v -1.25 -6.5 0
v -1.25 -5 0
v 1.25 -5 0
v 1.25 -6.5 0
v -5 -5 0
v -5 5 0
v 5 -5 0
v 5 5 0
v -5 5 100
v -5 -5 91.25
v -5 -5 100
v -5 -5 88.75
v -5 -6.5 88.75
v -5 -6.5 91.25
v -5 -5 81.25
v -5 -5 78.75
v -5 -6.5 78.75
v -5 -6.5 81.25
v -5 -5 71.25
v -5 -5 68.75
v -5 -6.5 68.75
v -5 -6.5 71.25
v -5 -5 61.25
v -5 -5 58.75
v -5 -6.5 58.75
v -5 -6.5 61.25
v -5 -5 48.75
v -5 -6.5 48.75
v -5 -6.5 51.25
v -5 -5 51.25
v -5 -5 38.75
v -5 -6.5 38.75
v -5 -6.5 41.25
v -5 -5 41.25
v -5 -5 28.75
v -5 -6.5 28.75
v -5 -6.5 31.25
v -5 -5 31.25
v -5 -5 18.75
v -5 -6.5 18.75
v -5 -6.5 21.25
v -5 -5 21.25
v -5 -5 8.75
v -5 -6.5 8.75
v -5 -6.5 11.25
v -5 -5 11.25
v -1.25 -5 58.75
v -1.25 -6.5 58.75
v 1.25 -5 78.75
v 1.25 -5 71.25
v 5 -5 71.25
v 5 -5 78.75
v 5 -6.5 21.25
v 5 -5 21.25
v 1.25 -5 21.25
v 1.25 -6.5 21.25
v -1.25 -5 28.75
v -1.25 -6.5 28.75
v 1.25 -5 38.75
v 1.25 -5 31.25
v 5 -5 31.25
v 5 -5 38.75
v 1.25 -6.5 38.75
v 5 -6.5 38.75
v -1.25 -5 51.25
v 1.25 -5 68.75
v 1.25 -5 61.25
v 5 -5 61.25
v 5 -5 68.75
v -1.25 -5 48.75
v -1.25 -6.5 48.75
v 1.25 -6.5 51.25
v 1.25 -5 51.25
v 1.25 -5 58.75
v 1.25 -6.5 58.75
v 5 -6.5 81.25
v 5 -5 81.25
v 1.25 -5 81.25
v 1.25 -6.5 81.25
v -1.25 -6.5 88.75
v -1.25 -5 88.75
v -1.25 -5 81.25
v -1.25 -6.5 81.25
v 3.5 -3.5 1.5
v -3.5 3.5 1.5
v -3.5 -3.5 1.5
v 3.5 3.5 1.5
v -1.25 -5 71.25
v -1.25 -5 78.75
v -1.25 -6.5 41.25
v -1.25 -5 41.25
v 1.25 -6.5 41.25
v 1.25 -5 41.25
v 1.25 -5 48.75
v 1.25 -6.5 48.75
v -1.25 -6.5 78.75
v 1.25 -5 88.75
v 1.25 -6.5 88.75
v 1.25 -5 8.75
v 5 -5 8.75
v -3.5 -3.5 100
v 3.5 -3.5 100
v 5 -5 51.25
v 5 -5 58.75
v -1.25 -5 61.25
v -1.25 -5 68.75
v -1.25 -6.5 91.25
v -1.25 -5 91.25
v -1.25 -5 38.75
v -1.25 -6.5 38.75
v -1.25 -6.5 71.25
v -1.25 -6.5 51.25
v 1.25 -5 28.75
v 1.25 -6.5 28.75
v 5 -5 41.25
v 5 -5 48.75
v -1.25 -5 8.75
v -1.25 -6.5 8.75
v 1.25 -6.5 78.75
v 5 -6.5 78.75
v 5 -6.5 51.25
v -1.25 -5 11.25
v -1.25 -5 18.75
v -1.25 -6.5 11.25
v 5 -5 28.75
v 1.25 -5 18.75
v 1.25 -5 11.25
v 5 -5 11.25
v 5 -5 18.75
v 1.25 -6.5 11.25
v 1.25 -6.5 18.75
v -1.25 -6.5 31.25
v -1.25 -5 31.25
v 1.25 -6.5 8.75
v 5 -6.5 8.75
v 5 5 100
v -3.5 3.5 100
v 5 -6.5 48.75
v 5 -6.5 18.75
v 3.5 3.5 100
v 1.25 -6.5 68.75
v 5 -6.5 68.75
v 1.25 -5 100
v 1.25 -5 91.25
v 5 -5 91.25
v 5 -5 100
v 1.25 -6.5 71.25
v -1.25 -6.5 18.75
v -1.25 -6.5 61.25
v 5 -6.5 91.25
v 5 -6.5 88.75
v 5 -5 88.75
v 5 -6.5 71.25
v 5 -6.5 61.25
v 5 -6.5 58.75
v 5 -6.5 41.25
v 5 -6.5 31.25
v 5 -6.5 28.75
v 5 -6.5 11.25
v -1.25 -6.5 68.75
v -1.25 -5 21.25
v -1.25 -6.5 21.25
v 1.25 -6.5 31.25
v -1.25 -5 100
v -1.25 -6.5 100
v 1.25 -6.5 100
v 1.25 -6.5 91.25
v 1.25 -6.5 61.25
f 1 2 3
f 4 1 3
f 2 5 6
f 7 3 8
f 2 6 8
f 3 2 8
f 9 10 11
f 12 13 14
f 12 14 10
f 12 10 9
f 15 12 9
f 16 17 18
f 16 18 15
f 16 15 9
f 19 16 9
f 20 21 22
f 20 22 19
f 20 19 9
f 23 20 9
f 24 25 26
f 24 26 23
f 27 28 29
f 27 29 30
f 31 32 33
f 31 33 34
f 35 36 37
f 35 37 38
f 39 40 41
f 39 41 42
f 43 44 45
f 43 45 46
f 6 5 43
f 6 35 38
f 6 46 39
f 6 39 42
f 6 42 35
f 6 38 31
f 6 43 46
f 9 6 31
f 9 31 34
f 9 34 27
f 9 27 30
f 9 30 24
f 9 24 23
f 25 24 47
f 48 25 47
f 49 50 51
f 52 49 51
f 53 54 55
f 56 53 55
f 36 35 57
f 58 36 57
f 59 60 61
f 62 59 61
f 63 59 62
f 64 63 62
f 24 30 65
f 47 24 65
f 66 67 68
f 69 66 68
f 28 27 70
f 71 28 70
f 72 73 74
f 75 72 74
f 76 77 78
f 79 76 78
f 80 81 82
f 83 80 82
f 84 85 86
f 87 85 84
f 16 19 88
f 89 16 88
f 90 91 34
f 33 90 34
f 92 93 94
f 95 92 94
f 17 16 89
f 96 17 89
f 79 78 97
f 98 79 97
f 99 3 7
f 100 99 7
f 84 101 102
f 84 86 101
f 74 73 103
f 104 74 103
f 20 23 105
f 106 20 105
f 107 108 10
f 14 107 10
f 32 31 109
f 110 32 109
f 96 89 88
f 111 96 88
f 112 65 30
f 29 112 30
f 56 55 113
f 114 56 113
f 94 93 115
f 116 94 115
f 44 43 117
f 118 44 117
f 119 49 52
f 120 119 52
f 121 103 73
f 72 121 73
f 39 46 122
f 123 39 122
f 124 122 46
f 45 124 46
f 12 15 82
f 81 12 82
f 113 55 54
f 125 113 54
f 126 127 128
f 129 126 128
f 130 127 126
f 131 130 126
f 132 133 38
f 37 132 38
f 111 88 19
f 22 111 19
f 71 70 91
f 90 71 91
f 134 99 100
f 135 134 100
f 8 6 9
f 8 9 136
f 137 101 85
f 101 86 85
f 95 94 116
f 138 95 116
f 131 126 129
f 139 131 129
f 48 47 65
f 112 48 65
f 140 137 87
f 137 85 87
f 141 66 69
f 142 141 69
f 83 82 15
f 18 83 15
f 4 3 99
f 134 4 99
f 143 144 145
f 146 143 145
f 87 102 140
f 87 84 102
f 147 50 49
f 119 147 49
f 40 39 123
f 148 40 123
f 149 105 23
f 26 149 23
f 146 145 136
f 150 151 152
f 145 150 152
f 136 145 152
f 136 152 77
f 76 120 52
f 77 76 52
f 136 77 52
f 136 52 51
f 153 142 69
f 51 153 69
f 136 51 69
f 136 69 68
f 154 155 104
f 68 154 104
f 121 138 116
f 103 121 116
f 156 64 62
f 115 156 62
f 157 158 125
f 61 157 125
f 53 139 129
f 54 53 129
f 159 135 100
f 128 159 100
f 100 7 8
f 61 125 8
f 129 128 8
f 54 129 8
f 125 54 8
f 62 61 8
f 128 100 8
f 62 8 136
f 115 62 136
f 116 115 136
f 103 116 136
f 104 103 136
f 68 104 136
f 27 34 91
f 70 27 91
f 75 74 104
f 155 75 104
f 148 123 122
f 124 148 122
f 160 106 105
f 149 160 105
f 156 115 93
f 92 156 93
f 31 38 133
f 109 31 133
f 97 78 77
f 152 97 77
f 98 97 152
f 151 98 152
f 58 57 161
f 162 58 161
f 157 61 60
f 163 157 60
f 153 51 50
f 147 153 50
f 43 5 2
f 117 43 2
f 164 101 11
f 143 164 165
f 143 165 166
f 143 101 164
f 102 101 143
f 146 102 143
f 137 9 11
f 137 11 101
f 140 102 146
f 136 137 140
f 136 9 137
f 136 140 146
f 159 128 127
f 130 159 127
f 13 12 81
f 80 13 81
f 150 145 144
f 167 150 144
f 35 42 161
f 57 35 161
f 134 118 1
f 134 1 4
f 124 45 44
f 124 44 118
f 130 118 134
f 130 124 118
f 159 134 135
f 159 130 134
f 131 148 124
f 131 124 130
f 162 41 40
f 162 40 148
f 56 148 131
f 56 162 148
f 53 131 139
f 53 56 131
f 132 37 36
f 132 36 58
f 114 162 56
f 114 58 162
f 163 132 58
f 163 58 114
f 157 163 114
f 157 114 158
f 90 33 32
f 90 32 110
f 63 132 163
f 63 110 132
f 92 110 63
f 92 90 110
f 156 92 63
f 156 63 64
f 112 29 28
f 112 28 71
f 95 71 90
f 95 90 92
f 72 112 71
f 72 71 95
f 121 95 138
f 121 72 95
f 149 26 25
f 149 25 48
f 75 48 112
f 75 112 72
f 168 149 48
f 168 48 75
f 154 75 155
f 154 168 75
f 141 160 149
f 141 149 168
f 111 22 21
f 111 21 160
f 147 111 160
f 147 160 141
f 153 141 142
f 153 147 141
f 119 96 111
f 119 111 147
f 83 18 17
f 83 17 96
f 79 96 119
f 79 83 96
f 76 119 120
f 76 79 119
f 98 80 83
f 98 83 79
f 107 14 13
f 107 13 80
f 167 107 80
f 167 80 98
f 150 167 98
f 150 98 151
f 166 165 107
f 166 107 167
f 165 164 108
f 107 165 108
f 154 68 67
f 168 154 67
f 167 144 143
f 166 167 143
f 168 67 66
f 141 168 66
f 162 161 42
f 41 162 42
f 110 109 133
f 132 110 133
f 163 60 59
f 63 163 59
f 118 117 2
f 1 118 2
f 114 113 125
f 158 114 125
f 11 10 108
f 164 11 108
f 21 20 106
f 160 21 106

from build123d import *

# Parameters (mm, degrees)
F0_W     = 10
F0_H     = 10
F1_DEPTH = 100
F2_T     = -1.5
F4_DEPTH = 1.5


with BuildPart() as f1:
    # F0 (on Top) → F1 (new body)
    with BuildSketch(Plane.XY):
        Rectangle(F0_W, F0_H)
    extrude(amount=F1_DEPTH)

    # F2
    f2_openings = [f1.faces().sort_by_distance(p)[0] for p in [
        (0, 0, 100),
    ]]
    offset(amount=F2_T, openings=f2_openings)

    # F3 (on face) → F4 (join)
    with BuildSketch(Plane.XZ.offset(5)):
        Polygon((1.25, 100), (-1.25, 100), (-1.25, 91.25), (-5, 91.25), (-5, 88.75), (-1.25, 88.75), (-1.25, 81.25), (-5, 81.25), (-5, 78.75), (-1.25, 78.75), (-1.25, 71.25), (-5, 71.25), (-5, 68.75), (-1.25, 68.75), (-1.25, 61.25), (-5, 61.25), (-5, 58.75), (-1.25, 58.75), (-1.25, 51.25), (-5, 51.25), (-5, 48.75), (-1.25, 48.75), (-1.25, 41.25), (-5, 41.25), (-5, 38.75), (-1.25, 38.75), (-1.25, 31.25), (-5, 31.25), (-5, 28.75), (-1.25, 28.75), (-1.25, 21.25), (-5, 21.25), (-5, 18.75), (-1.25, 18.75), (-1.25, 11.25), (-5, 11.25), (-5, 8.75), (-1.25, 8.75), (-1.25, 0), (1.25, 0), (1.25, 8.75), (5, 8.75), (5, 11.25), (1.25, 11.25), (1.25, 18.75), (5, 18.75), (5, 21.25), (1.25, 21.25), (1.25, 28.75), (5, 28.75), (5, 31.25), (1.25, 31.25), (1.25, 38.75), (5, 38.75), (5, 41.25), (1.25, 41.25), (1.25, 48.75), (5, 48.75), (5, 51.25), (1.25, 51.25), (1.25, 58.75), (5, 58.75), (5, 61.25), (1.25, 61.25), (1.25, 68.75), (5, 68.75), (5, 71.25), (1.25, 71.25), (1.25, 78.75), (5, 78.75), (5, 81.25), (1.25, 81.25), (1.25, 88.75), (5, 88.75), (5, 91.25), (1.25, 91.25), align=None)
    extrude(amount=F4_DEPTH)


solid = f1.part
